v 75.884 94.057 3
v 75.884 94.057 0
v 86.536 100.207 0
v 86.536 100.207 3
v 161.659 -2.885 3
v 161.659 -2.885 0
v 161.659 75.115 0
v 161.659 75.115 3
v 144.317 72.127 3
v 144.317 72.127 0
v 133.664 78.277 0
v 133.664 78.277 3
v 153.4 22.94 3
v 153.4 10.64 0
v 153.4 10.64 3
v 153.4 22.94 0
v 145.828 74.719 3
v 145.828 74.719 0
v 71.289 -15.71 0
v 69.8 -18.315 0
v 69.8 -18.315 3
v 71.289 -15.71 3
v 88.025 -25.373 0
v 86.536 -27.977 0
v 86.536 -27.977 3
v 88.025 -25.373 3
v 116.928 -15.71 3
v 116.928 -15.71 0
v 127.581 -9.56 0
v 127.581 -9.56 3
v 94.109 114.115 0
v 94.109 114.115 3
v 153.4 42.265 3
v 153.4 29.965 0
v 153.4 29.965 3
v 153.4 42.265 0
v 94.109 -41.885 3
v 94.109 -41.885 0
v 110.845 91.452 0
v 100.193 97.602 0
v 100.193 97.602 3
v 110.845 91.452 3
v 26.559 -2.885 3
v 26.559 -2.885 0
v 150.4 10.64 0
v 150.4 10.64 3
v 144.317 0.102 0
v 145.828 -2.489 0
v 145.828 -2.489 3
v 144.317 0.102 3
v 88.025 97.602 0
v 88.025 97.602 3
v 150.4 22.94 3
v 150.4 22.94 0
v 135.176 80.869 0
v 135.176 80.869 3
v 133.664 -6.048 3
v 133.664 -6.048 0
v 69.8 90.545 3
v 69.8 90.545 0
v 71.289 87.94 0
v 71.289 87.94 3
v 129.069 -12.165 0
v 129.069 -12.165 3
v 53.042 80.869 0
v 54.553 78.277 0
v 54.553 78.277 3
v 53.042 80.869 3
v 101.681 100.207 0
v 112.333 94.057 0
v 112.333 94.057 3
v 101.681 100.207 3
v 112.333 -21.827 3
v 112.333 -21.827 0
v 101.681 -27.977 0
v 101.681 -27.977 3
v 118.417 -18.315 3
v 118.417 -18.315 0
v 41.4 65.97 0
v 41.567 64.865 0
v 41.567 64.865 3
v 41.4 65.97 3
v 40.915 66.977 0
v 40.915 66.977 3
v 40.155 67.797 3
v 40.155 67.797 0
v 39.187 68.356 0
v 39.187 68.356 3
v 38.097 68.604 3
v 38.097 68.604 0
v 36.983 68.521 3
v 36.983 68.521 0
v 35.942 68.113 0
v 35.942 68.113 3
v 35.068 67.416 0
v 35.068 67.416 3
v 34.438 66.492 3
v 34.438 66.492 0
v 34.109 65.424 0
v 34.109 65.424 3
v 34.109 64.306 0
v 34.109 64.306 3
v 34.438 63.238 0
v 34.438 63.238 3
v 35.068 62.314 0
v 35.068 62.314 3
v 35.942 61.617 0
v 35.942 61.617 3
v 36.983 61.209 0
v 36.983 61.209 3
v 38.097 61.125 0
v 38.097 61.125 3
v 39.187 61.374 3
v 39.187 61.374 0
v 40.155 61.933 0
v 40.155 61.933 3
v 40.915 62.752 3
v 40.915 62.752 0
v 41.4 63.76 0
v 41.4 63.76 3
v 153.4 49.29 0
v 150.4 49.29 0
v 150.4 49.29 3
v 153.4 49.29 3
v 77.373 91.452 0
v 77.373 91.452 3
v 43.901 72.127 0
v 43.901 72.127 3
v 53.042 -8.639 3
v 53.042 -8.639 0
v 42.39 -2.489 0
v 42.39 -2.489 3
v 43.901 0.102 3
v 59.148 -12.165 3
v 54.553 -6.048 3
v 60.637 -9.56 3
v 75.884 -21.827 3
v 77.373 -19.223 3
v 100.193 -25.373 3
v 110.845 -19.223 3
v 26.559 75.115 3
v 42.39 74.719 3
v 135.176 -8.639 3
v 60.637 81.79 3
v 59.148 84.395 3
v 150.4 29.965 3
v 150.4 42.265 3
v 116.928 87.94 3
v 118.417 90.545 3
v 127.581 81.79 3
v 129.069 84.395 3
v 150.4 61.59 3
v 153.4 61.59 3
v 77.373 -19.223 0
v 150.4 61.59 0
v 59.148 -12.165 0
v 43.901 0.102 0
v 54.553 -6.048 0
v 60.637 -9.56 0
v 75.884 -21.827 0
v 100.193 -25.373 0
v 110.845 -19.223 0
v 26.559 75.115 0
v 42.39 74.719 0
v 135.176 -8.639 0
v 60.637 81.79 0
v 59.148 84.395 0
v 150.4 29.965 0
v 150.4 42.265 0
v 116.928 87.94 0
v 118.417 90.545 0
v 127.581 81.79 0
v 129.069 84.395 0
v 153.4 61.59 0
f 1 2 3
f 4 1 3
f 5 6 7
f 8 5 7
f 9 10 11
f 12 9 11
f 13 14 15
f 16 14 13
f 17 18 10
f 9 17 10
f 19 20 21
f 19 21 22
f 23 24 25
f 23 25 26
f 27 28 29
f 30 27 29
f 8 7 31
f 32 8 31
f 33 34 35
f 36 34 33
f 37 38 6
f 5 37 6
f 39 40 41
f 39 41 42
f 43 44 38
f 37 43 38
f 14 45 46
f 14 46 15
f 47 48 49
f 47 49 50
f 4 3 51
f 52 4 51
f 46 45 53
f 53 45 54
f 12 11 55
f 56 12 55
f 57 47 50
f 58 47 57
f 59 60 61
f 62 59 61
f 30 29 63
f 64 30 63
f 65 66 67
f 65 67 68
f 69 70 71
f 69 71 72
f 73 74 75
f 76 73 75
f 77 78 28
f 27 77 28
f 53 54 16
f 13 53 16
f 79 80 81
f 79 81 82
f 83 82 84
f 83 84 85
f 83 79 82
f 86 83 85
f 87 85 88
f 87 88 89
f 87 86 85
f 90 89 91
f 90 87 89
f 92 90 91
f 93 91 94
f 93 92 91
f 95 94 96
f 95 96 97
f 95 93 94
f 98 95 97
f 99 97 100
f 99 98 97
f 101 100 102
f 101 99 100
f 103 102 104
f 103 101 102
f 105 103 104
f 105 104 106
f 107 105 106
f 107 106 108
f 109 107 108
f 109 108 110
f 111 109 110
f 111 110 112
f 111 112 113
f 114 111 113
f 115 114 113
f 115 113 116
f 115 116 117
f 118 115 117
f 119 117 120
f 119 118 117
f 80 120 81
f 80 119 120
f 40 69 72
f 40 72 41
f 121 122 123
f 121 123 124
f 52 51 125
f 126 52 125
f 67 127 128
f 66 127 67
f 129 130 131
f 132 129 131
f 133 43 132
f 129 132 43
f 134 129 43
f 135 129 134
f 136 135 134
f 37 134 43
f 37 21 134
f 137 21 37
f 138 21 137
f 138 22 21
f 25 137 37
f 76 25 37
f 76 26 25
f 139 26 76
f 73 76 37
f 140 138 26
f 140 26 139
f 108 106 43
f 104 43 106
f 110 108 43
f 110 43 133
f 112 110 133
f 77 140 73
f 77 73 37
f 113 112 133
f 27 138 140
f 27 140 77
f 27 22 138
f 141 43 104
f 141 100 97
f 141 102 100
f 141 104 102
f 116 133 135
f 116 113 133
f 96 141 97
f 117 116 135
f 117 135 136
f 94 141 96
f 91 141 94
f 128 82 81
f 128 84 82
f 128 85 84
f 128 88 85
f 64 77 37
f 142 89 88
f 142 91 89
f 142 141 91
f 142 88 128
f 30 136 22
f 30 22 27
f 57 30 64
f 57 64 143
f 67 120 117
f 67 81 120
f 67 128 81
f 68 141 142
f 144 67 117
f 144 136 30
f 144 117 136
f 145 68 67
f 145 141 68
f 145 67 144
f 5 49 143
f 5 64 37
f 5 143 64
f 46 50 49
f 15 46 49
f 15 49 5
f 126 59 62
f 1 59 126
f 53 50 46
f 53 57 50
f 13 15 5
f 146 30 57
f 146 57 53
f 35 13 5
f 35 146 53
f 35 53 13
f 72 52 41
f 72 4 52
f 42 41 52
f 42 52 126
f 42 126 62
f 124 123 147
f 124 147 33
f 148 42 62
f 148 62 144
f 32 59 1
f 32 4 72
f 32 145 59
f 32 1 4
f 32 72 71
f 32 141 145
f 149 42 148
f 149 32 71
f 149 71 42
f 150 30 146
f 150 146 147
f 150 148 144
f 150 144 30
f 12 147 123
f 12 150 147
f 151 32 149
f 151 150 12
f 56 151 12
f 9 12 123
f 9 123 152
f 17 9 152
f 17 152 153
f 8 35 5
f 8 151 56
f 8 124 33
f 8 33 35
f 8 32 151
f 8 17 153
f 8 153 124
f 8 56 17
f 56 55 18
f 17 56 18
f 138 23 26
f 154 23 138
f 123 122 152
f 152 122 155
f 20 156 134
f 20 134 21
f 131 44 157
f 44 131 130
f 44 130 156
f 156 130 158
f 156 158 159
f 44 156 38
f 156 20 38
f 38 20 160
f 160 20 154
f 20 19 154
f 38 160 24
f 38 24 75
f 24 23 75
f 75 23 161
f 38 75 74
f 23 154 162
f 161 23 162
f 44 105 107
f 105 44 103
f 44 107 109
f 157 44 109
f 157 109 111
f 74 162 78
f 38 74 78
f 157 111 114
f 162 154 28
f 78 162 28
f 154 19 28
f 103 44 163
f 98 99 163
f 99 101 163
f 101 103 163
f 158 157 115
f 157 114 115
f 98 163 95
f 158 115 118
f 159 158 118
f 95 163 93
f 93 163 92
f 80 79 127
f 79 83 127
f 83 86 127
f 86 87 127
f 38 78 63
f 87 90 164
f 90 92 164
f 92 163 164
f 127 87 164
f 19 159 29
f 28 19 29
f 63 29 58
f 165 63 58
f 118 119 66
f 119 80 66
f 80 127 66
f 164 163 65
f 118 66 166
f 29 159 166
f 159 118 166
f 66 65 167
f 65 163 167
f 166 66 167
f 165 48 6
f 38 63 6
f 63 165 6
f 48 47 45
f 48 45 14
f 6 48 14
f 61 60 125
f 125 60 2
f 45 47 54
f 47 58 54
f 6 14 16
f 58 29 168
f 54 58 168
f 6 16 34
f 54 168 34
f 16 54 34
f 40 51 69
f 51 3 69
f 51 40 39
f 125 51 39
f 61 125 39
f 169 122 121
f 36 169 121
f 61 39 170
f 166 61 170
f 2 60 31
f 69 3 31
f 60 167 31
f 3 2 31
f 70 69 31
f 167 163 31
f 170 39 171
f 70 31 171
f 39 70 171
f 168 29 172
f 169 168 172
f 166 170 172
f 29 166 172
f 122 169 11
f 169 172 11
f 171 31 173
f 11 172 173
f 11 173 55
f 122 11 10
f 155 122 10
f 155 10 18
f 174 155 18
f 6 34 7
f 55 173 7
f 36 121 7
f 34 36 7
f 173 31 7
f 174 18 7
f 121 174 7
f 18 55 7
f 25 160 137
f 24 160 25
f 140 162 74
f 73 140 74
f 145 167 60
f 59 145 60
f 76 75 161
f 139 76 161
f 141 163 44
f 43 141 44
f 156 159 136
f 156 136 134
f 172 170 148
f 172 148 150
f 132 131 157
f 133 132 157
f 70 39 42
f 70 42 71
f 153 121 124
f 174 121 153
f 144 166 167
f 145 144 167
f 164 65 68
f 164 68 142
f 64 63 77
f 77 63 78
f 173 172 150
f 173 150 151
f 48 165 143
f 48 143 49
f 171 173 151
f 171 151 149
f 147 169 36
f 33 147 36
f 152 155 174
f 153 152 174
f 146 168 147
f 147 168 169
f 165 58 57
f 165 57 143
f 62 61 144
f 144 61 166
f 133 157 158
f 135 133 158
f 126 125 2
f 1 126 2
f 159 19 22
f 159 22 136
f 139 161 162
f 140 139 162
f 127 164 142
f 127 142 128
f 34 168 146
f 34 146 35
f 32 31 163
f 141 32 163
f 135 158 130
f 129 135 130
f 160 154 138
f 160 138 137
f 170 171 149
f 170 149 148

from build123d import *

# Parameters (mm, degrees)
CROQUIS1_R              = 3.75
CROQUIS1_W              = 3
CROQUIS1_H              = 12.3
SALIENTE_EXTRUIR1_DEPTH = 3


with BuildPart() as part:
    # Croquis1 → Saliente-Extruir1 (new body)
    with BuildSketch(Plane.XY):
        Polygon((94.108737778, 114.11492022), (26.558756283, 75.11492022), (26.558756283, -2.88507978), (94.108737778, -41.88507978), (161.658719273, -2.88507978), (161.658719273, 75.11492022), align=None)
        with Locations((37.817086532, 64.86492022)):
            Circle(CROQUIS1_R, mode=Mode.SUBTRACT)
        Polygon((101.681254795, 100.207027049), (100.19256624, 97.60242022), (110.844695242, 91.452410673), (112.333383798, 94.057017502), align=None, mode=Mode.SUBTRACT)
        Polygon((135.175742963, 80.868975289), (145.827871965, 74.718965742), (144.316560563, 72.12742022), (133.66443156, 78.277429767), align=None, mode=Mode.SUBTRACT)
        Polygon((133.66443156, -6.047589327), (135.175742963, -8.639134849), (145.827871965, -2.489125302), (144.316560563, 0.10242022), align=None, mode=Mode.SUBTRACT)
        Polygon((118.417179188, 90.544536596), (116.928490632, 87.939929767), (127.580619634, 81.78992022), (129.06930819, 84.394527049), align=None, mode=Mode.SUBTRACT)
        Polygon((129.06930819, -12.164686608), (118.417179188, -18.314696155), (116.928490632, -15.710089327), (127.580619634, -9.56007978), align=None, mode=Mode.SUBTRACT)
        Polygon((112.333383798, -21.827177061), (101.681254795, -27.977186608), (100.19256624, -25.37257978), (110.844695242, -19.222570233), align=None, mode=Mode.SUBTRACT)
        Polygon((77.372780314, -19.222570233), (75.884091759, -21.827177061), (86.536220761, -27.977186608), (88.024909317, -25.37257978), align=None, mode=Mode.SUBTRACT)
        Polygon((60.636855922, -9.56007978), (59.148167366, -12.164686608), (69.800296369, -18.314696155), (71.288984924, -15.710089327), align=None, mode=Mode.SUBTRACT)
        Polygon((43.900914994, 0.10242022), (54.553043996, -6.047589327), (53.041732593, -8.639134849), (42.389603591, -2.489125302), align=None, mode=Mode.SUBTRACT)
        Polygon((54.553043996, 78.277429767), (53.041732593, 80.868975289), (42.389603591, 74.718965742), (43.900914994, 72.12742022), align=None, mode=Mode.SUBTRACT)
        Polygon((59.148167366, 84.394527049), (69.800296369, 90.544536596), (71.288984924, 87.939929767), (60.636855922, 81.78992022), align=None, mode=Mode.SUBTRACT)
        Polygon((75.884091759, 94.057017502), (86.536220761, 100.207027049), (88.024909317, 97.60242022), (77.372780314, 91.452410673), align=None, mode=Mode.SUBTRACT)
        with Locations((151.900389024, 55.43992022)):
            Rectangle(CROQUIS1_W, CROQUIS1_H, mode=Mode.SUBTRACT)
        with Locations((151.900389024, 36.11492022)):
            Rectangle(CROQUIS1_W, CROQUIS1_H, mode=Mode.SUBTRACT)
        with Locations((151.900389024, 16.78992022)):
            Rectangle(CROQUIS1_W, CROQUIS1_H, mode=Mode.SUBTRACT)
    extrude(amount=SALIENTE_EXTRUIR1_DEPTH)


solid = part.part
